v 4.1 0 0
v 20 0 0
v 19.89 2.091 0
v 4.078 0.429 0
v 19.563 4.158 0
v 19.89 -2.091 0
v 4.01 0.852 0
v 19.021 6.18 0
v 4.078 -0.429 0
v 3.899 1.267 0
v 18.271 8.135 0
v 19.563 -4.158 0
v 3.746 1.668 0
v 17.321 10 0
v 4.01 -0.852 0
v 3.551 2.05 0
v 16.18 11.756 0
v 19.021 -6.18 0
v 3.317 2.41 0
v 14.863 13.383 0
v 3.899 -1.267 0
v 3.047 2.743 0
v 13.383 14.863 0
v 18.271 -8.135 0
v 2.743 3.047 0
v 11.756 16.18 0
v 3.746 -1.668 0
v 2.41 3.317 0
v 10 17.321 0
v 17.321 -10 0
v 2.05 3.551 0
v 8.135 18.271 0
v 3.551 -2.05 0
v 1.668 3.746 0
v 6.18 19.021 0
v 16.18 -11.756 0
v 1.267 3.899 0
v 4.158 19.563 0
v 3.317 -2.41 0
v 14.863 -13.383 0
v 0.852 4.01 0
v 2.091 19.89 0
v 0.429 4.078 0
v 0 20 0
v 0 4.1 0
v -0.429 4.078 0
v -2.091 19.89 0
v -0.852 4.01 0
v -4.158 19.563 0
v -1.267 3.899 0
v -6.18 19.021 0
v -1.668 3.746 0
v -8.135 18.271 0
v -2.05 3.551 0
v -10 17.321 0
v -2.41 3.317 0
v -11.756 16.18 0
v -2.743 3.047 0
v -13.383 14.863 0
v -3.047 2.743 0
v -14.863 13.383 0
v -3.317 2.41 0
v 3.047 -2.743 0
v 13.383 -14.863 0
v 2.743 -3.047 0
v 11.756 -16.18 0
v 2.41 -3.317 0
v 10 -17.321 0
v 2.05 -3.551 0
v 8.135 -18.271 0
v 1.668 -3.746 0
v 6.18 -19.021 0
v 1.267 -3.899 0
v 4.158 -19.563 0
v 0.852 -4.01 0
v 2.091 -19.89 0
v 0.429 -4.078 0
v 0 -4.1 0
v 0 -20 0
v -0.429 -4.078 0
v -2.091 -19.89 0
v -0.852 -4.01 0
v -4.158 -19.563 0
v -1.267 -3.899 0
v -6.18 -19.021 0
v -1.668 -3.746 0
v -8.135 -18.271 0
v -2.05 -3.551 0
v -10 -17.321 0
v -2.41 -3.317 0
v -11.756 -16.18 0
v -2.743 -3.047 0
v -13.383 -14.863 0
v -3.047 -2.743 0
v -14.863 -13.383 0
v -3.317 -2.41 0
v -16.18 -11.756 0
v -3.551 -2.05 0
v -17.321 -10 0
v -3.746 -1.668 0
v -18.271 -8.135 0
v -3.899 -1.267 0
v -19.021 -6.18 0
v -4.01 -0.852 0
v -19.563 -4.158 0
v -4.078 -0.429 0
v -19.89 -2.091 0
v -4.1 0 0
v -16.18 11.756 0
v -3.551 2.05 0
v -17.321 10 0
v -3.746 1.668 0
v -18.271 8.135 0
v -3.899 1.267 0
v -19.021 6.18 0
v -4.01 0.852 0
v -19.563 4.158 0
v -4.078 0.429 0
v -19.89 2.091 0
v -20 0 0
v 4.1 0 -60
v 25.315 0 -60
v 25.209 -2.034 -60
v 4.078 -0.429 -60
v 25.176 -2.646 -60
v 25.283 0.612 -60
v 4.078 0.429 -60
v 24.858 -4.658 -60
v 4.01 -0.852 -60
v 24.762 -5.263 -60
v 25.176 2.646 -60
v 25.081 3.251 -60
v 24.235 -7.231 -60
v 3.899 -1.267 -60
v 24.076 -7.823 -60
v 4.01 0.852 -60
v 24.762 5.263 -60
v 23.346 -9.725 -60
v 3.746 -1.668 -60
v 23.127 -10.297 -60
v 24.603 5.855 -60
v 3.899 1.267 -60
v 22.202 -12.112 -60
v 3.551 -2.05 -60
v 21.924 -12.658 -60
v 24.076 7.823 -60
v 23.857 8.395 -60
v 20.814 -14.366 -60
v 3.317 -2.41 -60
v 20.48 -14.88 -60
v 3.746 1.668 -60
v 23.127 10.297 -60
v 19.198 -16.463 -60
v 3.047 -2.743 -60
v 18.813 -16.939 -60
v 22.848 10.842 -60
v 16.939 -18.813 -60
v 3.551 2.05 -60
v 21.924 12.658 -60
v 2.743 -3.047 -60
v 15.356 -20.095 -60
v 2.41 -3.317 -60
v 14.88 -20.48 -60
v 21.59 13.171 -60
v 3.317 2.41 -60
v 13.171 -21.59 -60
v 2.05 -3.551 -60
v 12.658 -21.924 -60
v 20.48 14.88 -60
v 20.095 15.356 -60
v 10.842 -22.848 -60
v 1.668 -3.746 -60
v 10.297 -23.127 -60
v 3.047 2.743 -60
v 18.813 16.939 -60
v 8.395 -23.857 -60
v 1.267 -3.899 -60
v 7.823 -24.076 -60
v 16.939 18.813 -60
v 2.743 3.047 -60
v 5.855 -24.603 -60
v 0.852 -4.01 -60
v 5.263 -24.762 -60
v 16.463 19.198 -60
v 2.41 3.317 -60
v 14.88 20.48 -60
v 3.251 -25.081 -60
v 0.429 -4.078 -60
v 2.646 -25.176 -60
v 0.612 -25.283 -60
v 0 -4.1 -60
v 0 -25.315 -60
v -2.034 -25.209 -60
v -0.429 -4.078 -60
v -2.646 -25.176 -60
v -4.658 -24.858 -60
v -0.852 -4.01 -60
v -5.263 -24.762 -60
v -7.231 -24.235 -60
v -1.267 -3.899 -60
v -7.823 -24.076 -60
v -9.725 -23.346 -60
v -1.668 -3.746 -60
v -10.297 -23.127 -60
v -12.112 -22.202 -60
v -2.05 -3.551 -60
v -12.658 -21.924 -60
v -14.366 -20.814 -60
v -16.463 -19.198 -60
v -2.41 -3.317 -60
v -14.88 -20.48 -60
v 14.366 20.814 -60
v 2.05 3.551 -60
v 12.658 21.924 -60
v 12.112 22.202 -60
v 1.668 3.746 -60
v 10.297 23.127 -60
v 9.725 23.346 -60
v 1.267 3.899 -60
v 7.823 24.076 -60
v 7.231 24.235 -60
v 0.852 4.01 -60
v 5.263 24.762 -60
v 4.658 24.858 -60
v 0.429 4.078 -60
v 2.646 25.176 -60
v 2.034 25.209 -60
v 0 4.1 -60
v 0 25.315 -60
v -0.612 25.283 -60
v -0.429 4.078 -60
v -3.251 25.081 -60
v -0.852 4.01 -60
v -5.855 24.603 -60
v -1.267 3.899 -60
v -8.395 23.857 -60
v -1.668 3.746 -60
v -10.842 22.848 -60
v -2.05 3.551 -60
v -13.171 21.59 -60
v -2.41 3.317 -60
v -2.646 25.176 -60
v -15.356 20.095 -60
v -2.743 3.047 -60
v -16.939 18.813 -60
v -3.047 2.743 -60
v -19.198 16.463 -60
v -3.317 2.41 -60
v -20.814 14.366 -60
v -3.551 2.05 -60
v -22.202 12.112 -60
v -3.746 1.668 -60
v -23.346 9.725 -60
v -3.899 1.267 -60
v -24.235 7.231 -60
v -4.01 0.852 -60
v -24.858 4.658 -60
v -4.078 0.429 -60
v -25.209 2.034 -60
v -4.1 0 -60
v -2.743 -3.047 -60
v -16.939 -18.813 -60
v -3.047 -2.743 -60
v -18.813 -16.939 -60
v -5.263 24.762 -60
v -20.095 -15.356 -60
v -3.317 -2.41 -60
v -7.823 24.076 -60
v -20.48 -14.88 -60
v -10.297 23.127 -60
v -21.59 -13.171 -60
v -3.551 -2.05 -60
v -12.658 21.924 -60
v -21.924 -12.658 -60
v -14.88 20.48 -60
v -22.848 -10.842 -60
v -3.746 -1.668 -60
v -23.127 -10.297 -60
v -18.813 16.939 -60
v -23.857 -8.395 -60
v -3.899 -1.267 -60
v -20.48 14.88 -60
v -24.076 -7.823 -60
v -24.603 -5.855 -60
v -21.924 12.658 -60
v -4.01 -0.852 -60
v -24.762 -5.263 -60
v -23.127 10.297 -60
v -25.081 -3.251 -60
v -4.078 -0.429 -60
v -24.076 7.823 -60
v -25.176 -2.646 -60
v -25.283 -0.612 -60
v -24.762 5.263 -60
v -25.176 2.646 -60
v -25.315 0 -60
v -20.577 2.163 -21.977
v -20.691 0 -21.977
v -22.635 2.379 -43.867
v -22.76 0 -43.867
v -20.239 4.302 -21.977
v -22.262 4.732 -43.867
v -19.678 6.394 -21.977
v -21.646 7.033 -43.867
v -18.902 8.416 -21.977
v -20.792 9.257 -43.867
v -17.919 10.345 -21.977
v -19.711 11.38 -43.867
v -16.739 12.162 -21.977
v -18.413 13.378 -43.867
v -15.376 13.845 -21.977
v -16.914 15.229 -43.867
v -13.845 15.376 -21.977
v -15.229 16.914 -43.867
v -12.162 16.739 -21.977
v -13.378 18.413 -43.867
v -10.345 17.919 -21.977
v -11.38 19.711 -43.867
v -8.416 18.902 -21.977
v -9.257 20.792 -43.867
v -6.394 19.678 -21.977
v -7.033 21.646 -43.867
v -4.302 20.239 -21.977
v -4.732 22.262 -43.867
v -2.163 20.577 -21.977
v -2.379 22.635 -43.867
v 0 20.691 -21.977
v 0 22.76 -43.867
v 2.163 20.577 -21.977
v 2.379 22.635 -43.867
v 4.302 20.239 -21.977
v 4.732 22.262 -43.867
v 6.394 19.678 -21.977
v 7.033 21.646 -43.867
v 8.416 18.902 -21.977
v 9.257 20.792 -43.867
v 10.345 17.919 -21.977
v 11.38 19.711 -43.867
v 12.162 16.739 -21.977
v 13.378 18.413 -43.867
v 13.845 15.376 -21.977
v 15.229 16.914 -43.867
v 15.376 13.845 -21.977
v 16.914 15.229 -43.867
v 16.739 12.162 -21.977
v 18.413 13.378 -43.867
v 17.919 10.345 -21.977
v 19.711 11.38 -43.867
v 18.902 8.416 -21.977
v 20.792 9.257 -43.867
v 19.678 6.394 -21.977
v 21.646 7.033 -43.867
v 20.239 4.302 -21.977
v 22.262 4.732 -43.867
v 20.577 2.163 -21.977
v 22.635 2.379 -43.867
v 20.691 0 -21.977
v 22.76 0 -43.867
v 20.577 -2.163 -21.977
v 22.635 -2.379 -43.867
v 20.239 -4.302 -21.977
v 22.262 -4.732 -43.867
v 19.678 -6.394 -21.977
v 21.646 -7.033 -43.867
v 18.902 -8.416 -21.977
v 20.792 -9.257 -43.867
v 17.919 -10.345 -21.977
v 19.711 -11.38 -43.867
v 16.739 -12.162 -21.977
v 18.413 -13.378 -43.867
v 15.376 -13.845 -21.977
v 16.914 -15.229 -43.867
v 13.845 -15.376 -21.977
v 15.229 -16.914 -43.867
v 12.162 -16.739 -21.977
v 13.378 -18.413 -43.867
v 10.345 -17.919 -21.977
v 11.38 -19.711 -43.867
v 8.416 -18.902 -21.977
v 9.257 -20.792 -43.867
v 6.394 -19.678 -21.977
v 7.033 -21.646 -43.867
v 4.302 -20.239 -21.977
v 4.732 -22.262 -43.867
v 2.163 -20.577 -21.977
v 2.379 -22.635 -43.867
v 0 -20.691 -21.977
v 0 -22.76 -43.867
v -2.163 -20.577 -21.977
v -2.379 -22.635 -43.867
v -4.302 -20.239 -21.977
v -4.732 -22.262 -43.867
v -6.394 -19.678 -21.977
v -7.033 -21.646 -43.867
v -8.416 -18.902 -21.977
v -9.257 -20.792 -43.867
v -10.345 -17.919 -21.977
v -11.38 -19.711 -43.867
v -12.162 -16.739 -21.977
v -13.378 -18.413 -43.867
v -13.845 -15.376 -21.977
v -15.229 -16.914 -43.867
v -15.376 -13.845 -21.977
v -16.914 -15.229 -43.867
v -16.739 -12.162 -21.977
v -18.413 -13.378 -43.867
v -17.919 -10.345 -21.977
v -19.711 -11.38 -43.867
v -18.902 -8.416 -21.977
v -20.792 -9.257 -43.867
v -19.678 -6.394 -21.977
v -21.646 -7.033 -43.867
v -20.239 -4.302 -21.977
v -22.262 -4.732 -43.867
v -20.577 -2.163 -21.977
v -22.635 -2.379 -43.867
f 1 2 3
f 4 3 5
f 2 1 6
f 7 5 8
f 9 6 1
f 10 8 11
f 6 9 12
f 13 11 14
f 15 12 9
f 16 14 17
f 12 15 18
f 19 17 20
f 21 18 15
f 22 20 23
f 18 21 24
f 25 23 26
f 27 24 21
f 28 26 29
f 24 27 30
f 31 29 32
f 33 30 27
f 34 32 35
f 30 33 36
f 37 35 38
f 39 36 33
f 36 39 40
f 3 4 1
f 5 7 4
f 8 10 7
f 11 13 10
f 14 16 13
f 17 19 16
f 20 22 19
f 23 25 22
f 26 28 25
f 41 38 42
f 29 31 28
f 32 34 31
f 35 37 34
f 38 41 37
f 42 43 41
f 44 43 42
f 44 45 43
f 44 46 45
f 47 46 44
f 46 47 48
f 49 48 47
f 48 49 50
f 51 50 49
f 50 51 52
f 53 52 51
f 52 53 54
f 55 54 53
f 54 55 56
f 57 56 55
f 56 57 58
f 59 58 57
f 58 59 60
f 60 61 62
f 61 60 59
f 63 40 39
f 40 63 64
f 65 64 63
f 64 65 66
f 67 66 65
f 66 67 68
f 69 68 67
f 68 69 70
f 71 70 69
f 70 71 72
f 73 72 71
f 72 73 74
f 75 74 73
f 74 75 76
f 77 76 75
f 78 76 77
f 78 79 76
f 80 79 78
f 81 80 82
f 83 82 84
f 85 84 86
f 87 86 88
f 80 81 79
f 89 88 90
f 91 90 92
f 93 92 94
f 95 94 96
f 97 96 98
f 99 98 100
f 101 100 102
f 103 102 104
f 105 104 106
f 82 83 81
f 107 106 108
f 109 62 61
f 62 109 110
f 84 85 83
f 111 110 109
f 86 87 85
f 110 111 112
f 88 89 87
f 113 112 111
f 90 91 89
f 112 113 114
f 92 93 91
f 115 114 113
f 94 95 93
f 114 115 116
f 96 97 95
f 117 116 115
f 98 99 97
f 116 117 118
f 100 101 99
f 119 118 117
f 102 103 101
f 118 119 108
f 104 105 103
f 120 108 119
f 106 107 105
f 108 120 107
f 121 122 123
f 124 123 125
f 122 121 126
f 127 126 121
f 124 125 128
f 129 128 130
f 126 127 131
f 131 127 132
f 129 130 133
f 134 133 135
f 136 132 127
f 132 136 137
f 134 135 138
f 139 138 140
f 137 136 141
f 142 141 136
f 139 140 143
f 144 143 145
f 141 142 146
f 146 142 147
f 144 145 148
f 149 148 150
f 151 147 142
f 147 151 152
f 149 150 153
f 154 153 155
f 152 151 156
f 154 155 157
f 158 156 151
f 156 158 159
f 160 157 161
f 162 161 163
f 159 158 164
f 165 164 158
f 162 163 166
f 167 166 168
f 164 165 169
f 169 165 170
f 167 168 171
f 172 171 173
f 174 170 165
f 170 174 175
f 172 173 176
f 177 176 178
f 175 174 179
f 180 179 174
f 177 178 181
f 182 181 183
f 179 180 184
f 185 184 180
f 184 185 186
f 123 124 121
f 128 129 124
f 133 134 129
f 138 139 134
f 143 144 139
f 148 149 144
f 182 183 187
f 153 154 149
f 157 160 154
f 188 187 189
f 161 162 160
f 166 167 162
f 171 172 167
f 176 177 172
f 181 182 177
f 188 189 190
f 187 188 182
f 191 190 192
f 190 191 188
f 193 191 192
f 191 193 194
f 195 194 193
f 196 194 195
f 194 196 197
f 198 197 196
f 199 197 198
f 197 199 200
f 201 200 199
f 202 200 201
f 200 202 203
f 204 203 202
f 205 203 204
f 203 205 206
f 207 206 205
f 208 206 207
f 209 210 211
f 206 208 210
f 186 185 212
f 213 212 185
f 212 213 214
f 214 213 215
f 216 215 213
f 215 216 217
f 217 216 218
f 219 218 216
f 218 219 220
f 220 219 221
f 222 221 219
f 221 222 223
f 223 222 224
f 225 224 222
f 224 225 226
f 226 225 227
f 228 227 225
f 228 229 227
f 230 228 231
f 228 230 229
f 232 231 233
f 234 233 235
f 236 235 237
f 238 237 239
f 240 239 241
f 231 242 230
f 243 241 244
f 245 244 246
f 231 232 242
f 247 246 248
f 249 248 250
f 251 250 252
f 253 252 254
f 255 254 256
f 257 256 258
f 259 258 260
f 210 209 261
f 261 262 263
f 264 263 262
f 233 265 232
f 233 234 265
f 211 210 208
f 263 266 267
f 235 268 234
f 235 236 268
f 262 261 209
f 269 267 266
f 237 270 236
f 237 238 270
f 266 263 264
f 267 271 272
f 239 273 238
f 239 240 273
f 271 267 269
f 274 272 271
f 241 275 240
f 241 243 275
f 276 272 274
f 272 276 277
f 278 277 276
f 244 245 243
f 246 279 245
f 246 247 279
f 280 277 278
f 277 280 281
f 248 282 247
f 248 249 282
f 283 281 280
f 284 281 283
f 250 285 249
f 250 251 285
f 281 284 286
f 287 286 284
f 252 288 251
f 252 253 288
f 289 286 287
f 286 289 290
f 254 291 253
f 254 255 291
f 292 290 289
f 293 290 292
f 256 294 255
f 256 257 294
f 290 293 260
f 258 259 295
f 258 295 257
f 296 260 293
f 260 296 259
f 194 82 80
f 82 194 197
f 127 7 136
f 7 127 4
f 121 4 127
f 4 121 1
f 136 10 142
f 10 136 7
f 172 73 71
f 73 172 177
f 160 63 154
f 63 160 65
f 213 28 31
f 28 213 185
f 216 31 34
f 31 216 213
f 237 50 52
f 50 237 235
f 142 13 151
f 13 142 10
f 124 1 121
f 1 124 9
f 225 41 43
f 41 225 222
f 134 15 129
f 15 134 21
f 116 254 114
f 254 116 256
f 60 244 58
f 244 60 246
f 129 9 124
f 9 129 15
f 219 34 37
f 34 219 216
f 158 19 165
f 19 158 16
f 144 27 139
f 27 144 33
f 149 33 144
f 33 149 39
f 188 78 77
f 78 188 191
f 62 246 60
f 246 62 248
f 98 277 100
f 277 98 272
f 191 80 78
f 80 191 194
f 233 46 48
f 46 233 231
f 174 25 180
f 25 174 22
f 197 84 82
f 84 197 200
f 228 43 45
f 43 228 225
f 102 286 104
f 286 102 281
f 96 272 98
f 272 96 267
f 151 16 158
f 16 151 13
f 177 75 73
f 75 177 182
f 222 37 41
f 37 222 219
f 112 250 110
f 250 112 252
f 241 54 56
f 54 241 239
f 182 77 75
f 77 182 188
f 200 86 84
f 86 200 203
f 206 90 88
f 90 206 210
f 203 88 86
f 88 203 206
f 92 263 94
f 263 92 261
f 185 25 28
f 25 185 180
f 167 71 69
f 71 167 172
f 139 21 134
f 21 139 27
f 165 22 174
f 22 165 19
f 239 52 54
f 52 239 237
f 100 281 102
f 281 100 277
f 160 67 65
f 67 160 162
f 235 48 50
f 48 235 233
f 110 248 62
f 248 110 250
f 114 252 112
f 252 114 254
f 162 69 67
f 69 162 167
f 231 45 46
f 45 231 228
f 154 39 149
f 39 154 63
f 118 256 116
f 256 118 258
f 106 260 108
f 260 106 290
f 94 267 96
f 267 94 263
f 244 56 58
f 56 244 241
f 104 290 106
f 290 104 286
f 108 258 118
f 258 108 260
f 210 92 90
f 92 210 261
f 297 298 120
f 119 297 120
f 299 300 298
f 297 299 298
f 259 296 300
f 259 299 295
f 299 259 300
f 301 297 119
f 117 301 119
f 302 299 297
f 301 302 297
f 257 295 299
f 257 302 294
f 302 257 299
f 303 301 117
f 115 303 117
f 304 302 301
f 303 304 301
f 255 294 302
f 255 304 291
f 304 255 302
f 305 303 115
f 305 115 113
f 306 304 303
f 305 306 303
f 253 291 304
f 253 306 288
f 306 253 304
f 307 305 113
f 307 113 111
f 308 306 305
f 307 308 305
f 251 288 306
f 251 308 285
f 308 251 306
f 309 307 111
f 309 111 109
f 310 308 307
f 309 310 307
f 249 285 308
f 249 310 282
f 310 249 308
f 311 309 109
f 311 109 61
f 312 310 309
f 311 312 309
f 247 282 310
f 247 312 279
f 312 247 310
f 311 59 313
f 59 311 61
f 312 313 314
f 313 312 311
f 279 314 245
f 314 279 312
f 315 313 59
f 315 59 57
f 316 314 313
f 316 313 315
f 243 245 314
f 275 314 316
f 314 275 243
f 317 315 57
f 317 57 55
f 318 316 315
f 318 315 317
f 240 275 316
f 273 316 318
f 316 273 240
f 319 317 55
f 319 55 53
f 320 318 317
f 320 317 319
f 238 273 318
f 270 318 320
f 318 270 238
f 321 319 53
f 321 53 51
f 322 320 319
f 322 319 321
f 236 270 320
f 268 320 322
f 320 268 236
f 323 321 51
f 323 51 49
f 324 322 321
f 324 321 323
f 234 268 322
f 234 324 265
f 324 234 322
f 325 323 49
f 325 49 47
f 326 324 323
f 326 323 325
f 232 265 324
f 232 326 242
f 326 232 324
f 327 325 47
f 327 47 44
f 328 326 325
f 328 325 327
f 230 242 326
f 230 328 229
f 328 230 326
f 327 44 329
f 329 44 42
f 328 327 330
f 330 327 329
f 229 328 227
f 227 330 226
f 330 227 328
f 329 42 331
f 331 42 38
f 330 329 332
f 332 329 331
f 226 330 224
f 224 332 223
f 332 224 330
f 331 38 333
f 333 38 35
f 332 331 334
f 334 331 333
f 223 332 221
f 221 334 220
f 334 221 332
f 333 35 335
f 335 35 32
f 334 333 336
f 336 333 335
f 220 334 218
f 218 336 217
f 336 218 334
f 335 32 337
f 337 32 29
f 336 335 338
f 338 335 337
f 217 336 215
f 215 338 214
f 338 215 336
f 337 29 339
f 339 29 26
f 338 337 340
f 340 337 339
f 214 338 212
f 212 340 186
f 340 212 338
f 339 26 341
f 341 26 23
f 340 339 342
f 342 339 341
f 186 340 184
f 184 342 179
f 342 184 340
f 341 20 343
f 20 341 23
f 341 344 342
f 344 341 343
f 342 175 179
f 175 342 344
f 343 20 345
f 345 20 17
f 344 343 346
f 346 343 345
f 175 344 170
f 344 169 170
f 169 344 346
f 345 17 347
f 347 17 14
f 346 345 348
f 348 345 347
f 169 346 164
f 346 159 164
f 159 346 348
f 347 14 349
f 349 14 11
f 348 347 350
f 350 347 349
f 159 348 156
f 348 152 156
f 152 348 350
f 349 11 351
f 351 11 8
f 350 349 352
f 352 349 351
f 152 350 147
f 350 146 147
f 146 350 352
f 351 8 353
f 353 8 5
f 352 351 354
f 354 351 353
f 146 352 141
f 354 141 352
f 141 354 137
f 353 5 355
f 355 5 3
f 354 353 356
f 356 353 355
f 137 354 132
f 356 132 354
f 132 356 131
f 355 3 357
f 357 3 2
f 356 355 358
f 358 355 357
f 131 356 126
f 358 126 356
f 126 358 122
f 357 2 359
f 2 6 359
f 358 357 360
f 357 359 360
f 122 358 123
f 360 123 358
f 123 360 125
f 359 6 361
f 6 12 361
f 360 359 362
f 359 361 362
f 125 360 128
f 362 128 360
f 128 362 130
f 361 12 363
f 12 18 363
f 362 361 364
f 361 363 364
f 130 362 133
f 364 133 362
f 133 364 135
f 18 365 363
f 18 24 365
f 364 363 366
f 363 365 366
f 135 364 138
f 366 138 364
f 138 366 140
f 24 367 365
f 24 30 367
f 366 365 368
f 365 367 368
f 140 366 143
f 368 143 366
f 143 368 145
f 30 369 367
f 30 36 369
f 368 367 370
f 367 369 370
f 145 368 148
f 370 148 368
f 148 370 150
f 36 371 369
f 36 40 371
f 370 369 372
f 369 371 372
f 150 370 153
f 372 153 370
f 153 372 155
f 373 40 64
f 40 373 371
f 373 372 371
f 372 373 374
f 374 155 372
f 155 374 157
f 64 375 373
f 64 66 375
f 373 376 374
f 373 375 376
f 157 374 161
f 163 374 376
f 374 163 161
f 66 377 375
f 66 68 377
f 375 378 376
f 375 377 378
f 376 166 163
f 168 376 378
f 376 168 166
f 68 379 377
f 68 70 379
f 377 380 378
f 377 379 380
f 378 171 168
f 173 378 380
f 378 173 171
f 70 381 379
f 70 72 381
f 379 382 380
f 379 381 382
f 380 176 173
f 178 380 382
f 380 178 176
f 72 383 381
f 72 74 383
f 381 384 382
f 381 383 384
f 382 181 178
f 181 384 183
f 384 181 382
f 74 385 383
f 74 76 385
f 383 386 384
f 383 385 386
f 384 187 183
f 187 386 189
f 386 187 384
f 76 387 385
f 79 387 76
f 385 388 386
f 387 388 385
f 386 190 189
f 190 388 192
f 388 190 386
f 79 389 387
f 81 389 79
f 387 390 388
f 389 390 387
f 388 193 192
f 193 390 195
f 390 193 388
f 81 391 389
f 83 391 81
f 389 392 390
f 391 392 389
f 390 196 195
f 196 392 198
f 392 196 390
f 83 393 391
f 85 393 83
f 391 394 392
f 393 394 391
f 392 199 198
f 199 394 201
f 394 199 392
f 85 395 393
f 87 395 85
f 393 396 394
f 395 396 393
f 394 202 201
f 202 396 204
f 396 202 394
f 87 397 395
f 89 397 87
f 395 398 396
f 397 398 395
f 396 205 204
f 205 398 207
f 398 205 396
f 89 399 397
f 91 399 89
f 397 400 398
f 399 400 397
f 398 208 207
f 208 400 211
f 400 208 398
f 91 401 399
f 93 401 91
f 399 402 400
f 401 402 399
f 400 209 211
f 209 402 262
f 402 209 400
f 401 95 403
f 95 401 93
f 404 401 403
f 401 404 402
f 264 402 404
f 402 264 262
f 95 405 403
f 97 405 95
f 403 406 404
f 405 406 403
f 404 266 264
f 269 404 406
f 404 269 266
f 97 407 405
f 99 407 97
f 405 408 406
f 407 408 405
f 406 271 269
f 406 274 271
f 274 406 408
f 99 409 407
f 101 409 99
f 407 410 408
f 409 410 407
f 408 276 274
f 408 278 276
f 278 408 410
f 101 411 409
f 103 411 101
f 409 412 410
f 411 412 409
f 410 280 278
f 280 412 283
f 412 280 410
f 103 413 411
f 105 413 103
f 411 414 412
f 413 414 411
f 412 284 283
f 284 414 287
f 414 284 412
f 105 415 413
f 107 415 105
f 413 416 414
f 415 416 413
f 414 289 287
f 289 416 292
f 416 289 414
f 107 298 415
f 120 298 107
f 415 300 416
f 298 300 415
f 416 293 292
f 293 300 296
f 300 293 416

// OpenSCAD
$fn= 60;
ld= 22.2;
lw= 7.4;


module halfRoll(){
  difference(){
    translate([0,0,-60])cylinder(r=30, h=60);
    cylinder(r=4.1, h= 120, center= true);    
    rotate_extrude(convexity = 10) translate([370, 0, 0]) circle(r = 350, $fn = 100);
  }
}

module halfBlock(bh=33, bw=25){ 
  difference(){  
    cube([40,bw,bh], center=true);
    translate([0,0,bh/2]) rotate([90,0,0]) cylinder(r=ld/2, h=lw, center=true);  
    translate([0,0,bh/2]) rotate([90,0,0]) cylinder(r=8.8, h=bw+1, center=true);  
    translate([15,0,0]) cylinder(r=2.6, h=bh, center = true);
    translate([-15,0,0]) cylinder(r=2.6, h=bh, center = true);
  }
}




//halfBlock(33, 20);

//halfBlock(15, 19);

//cd
halfRoll();
